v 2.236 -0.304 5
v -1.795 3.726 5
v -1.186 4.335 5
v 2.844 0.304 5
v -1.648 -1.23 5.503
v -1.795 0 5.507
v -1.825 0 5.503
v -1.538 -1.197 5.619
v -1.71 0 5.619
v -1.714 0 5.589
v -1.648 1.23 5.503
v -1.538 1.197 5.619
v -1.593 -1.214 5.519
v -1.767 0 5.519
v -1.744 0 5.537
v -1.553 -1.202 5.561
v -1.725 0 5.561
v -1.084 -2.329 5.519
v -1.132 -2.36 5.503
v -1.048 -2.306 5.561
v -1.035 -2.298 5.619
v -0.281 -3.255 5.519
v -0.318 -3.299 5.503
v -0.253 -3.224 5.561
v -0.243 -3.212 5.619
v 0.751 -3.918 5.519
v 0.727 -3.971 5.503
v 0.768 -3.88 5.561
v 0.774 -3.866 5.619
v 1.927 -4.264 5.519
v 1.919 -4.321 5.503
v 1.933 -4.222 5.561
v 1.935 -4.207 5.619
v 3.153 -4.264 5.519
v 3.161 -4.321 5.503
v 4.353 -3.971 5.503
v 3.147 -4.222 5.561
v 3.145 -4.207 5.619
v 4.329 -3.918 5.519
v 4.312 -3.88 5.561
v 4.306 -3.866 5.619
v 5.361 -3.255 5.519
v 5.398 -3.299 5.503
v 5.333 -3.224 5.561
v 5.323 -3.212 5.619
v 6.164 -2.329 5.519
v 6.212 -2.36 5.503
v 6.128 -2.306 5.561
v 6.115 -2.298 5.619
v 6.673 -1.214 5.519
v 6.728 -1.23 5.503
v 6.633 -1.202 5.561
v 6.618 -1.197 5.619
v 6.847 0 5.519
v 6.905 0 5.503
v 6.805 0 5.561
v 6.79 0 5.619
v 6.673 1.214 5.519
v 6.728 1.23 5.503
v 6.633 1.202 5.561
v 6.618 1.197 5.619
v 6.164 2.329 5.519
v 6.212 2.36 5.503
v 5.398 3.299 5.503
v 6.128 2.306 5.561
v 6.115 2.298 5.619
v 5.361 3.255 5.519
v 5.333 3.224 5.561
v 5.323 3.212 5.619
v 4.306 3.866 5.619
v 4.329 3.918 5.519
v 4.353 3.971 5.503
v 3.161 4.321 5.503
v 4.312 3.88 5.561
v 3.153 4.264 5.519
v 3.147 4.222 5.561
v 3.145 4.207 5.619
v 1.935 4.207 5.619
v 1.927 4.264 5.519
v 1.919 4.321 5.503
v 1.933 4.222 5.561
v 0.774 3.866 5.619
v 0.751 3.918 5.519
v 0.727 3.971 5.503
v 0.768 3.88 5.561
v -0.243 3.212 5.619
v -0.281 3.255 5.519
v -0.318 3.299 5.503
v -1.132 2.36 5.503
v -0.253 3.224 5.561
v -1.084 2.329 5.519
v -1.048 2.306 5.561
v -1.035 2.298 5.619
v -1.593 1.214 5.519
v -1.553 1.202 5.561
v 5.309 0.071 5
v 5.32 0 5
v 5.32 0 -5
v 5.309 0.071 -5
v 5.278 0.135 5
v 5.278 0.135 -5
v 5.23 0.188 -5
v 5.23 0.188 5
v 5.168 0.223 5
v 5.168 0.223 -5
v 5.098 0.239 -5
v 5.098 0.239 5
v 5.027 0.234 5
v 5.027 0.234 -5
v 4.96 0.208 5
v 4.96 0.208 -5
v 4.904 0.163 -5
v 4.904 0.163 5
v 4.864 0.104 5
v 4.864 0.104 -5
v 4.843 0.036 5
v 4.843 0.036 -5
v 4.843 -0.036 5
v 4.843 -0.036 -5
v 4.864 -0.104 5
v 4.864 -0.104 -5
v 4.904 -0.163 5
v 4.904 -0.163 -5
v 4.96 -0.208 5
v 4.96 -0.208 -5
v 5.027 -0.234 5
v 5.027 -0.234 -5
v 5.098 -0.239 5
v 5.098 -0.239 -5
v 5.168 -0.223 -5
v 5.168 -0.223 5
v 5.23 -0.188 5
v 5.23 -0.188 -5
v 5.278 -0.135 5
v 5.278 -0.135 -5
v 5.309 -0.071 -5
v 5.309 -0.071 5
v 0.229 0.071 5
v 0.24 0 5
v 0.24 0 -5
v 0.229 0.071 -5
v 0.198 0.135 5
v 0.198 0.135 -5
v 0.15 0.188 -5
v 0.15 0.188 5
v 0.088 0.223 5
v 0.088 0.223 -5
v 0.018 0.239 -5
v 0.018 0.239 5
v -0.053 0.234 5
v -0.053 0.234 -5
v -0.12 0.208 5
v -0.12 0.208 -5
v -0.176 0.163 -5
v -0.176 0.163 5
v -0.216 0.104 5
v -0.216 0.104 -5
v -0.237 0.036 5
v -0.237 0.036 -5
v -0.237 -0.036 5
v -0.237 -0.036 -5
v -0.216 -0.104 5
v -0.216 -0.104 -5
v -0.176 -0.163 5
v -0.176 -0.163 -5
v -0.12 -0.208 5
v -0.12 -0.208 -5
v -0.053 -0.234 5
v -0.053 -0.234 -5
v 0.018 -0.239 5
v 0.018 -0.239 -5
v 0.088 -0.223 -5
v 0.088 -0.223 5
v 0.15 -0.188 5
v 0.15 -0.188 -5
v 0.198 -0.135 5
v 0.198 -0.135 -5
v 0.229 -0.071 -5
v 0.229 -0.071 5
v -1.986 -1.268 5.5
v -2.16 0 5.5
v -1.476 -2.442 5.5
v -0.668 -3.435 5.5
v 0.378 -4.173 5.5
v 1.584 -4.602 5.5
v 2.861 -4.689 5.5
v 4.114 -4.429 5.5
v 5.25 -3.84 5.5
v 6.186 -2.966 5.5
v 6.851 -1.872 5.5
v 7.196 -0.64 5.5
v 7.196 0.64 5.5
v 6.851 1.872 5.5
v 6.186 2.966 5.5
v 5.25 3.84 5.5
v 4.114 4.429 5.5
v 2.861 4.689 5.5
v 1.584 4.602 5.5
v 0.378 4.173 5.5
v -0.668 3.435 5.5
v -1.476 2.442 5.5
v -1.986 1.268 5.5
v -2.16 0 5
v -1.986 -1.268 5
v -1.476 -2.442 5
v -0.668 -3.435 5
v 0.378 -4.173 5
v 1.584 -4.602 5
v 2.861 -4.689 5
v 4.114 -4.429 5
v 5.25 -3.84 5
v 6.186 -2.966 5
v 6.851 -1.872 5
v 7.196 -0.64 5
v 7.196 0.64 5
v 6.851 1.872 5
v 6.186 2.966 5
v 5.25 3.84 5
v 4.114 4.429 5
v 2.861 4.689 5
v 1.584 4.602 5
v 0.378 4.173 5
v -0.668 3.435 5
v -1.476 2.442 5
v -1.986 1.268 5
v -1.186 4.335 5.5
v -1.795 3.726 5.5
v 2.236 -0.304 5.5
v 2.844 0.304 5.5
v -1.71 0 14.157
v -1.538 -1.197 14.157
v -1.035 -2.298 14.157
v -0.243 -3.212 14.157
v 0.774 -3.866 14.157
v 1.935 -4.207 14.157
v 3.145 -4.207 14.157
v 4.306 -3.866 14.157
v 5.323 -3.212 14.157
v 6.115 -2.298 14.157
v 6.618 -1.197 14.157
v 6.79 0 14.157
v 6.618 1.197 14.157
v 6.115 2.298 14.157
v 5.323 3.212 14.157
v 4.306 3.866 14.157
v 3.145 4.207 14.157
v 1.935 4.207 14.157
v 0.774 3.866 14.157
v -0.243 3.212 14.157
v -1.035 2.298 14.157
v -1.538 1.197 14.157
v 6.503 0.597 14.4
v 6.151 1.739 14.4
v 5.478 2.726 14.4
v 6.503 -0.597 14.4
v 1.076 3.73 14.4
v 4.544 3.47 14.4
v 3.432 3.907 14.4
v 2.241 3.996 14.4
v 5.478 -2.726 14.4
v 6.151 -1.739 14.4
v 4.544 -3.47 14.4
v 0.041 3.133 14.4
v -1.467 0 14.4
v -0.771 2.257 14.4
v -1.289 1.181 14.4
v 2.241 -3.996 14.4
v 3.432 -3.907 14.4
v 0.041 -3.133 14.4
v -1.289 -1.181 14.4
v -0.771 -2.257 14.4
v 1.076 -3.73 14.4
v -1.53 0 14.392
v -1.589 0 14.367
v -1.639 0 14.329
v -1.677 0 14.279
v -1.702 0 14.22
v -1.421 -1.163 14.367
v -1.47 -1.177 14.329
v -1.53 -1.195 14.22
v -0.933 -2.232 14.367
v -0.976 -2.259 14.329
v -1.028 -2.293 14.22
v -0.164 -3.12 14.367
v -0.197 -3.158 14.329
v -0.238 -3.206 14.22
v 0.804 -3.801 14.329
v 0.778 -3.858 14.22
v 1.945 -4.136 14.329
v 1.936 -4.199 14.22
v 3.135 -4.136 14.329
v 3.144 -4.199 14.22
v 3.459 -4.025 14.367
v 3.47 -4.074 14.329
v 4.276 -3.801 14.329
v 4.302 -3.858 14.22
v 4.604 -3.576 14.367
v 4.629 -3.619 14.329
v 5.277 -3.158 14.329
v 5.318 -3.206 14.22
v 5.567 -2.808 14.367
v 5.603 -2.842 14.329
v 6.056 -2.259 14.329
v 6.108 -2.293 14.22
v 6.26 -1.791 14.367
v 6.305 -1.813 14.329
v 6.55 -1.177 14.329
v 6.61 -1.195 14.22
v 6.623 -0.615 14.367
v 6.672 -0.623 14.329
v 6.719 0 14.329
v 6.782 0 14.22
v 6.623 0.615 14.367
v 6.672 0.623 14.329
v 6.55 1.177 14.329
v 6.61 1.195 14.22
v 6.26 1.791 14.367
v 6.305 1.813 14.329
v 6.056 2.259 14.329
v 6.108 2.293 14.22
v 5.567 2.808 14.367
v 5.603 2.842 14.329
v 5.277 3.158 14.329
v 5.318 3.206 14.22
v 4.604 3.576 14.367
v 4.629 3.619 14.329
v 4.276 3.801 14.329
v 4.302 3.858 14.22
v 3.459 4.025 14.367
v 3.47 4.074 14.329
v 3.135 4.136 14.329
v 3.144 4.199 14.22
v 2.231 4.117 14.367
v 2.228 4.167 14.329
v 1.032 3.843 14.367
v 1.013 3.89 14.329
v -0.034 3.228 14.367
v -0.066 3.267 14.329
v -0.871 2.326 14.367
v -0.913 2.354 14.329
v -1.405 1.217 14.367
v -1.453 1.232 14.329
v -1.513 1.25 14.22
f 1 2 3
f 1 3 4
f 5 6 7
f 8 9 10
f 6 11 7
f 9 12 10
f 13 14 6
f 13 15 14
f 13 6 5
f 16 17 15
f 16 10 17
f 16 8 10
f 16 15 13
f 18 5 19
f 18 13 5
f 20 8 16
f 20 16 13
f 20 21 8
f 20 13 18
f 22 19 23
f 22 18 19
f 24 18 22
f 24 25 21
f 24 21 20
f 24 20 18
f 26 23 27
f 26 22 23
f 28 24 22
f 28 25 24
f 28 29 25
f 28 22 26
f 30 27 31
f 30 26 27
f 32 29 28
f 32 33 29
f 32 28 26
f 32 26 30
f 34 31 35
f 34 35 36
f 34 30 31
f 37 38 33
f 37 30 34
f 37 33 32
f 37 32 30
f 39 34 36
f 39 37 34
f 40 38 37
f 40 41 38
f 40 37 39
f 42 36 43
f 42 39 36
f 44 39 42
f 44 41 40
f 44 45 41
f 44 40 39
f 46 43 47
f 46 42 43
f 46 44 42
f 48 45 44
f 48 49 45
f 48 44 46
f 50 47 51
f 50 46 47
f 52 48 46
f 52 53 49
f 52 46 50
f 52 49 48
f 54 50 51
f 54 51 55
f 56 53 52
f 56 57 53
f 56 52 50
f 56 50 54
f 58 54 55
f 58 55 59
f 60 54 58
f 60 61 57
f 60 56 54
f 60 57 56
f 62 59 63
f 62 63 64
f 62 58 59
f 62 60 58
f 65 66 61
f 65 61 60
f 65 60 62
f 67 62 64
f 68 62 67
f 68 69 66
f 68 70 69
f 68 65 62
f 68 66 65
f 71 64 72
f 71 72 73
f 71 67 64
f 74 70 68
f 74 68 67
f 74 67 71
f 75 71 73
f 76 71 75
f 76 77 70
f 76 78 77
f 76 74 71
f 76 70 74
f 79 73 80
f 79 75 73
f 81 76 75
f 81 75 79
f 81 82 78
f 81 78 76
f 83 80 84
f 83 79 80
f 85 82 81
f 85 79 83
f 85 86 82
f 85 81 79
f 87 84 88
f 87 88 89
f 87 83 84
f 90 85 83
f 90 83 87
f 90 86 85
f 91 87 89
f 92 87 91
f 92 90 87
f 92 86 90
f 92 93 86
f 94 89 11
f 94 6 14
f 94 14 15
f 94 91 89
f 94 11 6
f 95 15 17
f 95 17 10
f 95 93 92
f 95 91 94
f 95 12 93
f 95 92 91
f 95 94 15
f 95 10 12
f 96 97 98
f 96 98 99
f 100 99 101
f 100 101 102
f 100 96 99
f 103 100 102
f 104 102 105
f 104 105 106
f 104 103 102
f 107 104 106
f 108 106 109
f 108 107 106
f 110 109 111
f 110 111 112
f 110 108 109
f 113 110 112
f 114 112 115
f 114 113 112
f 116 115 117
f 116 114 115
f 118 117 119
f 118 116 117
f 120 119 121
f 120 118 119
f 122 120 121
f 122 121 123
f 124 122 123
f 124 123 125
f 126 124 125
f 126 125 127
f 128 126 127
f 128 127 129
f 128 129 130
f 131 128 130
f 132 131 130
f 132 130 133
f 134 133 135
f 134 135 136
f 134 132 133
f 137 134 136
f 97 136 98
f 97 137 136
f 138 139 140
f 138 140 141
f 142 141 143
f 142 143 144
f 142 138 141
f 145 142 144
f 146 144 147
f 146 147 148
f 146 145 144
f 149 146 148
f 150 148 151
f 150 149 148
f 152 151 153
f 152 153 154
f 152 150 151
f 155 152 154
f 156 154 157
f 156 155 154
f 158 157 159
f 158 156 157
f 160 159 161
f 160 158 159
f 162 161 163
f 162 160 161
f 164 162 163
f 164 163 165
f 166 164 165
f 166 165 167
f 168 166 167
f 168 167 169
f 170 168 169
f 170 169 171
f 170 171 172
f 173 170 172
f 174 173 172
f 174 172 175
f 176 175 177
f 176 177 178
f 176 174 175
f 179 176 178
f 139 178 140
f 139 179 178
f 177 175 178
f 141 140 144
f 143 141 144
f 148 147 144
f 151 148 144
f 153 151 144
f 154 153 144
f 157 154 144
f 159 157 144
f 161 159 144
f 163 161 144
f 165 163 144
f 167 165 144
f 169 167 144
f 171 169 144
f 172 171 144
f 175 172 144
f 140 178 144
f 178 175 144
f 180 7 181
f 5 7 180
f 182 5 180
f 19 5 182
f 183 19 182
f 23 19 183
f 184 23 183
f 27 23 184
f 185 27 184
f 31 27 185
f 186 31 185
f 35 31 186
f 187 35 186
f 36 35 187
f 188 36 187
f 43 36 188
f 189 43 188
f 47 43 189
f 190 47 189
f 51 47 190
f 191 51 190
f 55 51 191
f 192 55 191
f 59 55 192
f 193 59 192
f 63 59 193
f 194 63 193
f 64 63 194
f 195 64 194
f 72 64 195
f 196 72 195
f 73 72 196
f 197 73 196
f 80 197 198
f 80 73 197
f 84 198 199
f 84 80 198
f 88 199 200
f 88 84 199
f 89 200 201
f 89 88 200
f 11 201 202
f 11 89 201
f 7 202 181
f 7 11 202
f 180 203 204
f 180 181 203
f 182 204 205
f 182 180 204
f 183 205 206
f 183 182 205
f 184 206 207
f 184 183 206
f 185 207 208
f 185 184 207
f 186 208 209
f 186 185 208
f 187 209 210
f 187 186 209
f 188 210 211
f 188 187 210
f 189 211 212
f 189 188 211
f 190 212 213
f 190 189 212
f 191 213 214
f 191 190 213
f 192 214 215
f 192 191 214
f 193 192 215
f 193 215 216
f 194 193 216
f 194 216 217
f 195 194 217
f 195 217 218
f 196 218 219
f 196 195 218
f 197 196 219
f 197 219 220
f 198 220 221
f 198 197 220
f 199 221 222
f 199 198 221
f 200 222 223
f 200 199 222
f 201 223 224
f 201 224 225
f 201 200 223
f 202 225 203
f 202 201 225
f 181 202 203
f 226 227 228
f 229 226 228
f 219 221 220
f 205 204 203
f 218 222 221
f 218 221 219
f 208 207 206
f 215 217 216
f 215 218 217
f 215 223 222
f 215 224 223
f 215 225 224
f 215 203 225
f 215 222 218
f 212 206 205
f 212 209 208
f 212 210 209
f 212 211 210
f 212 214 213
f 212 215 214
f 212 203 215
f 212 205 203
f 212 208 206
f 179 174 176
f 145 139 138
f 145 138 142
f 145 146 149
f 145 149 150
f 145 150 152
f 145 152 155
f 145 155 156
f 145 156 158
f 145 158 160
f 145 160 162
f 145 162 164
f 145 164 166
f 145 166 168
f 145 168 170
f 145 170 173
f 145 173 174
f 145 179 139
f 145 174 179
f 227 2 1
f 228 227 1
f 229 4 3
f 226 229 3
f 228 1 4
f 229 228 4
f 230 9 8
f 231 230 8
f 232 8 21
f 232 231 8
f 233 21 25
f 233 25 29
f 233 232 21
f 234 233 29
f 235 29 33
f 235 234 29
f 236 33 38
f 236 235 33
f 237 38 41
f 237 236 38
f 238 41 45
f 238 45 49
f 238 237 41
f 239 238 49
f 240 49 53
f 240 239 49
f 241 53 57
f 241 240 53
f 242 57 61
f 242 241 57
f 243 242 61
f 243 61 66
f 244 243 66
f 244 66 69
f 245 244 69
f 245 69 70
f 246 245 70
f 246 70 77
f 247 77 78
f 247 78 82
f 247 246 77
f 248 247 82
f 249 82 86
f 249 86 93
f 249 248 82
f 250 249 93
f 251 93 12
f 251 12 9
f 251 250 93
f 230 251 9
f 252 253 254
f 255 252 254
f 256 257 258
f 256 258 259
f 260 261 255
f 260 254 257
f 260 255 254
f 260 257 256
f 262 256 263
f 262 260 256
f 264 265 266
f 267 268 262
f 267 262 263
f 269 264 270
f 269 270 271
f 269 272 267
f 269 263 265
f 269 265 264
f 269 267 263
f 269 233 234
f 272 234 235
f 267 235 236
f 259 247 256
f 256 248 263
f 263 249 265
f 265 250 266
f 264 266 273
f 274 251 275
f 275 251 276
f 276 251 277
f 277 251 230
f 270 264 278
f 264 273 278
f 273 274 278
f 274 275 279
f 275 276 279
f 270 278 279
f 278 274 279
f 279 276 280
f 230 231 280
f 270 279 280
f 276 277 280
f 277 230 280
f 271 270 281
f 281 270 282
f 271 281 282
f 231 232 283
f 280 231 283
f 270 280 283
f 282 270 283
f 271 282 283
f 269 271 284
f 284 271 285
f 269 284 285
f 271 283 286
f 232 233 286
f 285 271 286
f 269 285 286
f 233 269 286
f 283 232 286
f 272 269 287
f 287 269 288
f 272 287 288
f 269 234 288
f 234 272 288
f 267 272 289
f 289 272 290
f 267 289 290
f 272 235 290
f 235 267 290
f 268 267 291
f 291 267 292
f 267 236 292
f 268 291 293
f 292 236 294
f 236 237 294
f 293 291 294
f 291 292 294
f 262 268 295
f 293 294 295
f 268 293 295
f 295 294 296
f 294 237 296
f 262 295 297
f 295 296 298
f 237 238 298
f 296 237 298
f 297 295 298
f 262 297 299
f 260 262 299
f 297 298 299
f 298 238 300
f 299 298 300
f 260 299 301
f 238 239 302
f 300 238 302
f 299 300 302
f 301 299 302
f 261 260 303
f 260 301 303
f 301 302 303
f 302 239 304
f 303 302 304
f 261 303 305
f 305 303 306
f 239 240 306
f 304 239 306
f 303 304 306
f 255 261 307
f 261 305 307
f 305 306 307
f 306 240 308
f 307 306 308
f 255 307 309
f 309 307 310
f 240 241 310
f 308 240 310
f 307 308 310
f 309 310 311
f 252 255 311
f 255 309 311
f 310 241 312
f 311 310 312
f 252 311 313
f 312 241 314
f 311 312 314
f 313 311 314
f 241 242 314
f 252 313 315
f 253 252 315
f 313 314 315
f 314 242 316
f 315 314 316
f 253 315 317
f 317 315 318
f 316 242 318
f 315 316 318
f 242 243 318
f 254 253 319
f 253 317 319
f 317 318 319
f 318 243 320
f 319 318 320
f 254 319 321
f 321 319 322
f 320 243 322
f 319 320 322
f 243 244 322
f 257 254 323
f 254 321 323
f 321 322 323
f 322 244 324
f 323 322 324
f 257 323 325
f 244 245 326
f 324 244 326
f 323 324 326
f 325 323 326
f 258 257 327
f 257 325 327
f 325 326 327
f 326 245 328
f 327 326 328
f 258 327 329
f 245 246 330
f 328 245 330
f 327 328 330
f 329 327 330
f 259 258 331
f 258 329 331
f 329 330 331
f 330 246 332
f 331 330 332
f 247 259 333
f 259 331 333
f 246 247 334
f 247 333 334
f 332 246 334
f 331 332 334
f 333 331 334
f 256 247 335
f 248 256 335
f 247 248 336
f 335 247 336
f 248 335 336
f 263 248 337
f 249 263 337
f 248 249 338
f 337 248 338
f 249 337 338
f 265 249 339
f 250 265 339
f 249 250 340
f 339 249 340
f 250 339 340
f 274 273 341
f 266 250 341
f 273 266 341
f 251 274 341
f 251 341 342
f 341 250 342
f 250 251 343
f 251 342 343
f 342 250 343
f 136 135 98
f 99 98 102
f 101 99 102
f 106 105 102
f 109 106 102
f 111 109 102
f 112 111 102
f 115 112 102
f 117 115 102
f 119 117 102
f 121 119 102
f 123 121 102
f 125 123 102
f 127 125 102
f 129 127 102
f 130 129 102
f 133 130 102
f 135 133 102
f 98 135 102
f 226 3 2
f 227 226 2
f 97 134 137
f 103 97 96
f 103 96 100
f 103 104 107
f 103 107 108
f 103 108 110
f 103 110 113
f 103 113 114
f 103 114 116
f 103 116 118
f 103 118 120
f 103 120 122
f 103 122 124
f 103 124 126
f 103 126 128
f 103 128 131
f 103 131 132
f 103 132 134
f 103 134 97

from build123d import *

# Parameters (mm, degrees)
SKETCH_R     = 0.24
PAD_DEPTH    = 10
PAD003_DEPTH = 0.5


with BuildPart() as pad:
    # Sketch → Pad (new body)
    with BuildSketch(Plane.XY.offset(5)):
        Circle(SKETCH_R)
        with Locations((5.08, 0)):
            Circle(SKETCH_R)
    extrude(amount=-PAD_DEPTH)


with BuildPart() as revolution:
    # Sketch003 → Revolution (revolve)
    with BuildSketch(Plane.XZ):
        with BuildLine():
            Line((2.54, 5), (-2.16, 5))
            Line((-2.16, 5), (-2.16, 5.5))
            Line((-2.16, 5.5), (-1.825033, 5.502932))
            ThreePointArc((-1.825033, 5.502932), (-1.743632, 5.537278), (-1.71, 5.618977))
            Line((-1.71, 5.618977), (-1.71, 14.157373))
            ThreePointArc((-1.467373, 14.4), (-1.638936, 14.328936), (-1.71, 14.157373))
            Line((-1.467373, 14.4), (2.54, 14.4))
            Line((2.54, 14.4), (2.54, 5))
        make_face()
    revolve(axis=Axis((2.54, 0, 2.550668), (0, 0, 1)))


with BuildPart() as pad003:
    # Sketch004 → Pad003 (new body)
    with BuildSketch(Plane.XY.offset(5)):
        Polygon((2.844056, 0.304056), (-1.186453, 4.334565), (-1.794565, 3.726453), (2.235944, -0.304056), align=None)
    extrude(amount=PAD003_DEPTH)


solid = Compound([pad.part, revolution.part, pad003.part])
